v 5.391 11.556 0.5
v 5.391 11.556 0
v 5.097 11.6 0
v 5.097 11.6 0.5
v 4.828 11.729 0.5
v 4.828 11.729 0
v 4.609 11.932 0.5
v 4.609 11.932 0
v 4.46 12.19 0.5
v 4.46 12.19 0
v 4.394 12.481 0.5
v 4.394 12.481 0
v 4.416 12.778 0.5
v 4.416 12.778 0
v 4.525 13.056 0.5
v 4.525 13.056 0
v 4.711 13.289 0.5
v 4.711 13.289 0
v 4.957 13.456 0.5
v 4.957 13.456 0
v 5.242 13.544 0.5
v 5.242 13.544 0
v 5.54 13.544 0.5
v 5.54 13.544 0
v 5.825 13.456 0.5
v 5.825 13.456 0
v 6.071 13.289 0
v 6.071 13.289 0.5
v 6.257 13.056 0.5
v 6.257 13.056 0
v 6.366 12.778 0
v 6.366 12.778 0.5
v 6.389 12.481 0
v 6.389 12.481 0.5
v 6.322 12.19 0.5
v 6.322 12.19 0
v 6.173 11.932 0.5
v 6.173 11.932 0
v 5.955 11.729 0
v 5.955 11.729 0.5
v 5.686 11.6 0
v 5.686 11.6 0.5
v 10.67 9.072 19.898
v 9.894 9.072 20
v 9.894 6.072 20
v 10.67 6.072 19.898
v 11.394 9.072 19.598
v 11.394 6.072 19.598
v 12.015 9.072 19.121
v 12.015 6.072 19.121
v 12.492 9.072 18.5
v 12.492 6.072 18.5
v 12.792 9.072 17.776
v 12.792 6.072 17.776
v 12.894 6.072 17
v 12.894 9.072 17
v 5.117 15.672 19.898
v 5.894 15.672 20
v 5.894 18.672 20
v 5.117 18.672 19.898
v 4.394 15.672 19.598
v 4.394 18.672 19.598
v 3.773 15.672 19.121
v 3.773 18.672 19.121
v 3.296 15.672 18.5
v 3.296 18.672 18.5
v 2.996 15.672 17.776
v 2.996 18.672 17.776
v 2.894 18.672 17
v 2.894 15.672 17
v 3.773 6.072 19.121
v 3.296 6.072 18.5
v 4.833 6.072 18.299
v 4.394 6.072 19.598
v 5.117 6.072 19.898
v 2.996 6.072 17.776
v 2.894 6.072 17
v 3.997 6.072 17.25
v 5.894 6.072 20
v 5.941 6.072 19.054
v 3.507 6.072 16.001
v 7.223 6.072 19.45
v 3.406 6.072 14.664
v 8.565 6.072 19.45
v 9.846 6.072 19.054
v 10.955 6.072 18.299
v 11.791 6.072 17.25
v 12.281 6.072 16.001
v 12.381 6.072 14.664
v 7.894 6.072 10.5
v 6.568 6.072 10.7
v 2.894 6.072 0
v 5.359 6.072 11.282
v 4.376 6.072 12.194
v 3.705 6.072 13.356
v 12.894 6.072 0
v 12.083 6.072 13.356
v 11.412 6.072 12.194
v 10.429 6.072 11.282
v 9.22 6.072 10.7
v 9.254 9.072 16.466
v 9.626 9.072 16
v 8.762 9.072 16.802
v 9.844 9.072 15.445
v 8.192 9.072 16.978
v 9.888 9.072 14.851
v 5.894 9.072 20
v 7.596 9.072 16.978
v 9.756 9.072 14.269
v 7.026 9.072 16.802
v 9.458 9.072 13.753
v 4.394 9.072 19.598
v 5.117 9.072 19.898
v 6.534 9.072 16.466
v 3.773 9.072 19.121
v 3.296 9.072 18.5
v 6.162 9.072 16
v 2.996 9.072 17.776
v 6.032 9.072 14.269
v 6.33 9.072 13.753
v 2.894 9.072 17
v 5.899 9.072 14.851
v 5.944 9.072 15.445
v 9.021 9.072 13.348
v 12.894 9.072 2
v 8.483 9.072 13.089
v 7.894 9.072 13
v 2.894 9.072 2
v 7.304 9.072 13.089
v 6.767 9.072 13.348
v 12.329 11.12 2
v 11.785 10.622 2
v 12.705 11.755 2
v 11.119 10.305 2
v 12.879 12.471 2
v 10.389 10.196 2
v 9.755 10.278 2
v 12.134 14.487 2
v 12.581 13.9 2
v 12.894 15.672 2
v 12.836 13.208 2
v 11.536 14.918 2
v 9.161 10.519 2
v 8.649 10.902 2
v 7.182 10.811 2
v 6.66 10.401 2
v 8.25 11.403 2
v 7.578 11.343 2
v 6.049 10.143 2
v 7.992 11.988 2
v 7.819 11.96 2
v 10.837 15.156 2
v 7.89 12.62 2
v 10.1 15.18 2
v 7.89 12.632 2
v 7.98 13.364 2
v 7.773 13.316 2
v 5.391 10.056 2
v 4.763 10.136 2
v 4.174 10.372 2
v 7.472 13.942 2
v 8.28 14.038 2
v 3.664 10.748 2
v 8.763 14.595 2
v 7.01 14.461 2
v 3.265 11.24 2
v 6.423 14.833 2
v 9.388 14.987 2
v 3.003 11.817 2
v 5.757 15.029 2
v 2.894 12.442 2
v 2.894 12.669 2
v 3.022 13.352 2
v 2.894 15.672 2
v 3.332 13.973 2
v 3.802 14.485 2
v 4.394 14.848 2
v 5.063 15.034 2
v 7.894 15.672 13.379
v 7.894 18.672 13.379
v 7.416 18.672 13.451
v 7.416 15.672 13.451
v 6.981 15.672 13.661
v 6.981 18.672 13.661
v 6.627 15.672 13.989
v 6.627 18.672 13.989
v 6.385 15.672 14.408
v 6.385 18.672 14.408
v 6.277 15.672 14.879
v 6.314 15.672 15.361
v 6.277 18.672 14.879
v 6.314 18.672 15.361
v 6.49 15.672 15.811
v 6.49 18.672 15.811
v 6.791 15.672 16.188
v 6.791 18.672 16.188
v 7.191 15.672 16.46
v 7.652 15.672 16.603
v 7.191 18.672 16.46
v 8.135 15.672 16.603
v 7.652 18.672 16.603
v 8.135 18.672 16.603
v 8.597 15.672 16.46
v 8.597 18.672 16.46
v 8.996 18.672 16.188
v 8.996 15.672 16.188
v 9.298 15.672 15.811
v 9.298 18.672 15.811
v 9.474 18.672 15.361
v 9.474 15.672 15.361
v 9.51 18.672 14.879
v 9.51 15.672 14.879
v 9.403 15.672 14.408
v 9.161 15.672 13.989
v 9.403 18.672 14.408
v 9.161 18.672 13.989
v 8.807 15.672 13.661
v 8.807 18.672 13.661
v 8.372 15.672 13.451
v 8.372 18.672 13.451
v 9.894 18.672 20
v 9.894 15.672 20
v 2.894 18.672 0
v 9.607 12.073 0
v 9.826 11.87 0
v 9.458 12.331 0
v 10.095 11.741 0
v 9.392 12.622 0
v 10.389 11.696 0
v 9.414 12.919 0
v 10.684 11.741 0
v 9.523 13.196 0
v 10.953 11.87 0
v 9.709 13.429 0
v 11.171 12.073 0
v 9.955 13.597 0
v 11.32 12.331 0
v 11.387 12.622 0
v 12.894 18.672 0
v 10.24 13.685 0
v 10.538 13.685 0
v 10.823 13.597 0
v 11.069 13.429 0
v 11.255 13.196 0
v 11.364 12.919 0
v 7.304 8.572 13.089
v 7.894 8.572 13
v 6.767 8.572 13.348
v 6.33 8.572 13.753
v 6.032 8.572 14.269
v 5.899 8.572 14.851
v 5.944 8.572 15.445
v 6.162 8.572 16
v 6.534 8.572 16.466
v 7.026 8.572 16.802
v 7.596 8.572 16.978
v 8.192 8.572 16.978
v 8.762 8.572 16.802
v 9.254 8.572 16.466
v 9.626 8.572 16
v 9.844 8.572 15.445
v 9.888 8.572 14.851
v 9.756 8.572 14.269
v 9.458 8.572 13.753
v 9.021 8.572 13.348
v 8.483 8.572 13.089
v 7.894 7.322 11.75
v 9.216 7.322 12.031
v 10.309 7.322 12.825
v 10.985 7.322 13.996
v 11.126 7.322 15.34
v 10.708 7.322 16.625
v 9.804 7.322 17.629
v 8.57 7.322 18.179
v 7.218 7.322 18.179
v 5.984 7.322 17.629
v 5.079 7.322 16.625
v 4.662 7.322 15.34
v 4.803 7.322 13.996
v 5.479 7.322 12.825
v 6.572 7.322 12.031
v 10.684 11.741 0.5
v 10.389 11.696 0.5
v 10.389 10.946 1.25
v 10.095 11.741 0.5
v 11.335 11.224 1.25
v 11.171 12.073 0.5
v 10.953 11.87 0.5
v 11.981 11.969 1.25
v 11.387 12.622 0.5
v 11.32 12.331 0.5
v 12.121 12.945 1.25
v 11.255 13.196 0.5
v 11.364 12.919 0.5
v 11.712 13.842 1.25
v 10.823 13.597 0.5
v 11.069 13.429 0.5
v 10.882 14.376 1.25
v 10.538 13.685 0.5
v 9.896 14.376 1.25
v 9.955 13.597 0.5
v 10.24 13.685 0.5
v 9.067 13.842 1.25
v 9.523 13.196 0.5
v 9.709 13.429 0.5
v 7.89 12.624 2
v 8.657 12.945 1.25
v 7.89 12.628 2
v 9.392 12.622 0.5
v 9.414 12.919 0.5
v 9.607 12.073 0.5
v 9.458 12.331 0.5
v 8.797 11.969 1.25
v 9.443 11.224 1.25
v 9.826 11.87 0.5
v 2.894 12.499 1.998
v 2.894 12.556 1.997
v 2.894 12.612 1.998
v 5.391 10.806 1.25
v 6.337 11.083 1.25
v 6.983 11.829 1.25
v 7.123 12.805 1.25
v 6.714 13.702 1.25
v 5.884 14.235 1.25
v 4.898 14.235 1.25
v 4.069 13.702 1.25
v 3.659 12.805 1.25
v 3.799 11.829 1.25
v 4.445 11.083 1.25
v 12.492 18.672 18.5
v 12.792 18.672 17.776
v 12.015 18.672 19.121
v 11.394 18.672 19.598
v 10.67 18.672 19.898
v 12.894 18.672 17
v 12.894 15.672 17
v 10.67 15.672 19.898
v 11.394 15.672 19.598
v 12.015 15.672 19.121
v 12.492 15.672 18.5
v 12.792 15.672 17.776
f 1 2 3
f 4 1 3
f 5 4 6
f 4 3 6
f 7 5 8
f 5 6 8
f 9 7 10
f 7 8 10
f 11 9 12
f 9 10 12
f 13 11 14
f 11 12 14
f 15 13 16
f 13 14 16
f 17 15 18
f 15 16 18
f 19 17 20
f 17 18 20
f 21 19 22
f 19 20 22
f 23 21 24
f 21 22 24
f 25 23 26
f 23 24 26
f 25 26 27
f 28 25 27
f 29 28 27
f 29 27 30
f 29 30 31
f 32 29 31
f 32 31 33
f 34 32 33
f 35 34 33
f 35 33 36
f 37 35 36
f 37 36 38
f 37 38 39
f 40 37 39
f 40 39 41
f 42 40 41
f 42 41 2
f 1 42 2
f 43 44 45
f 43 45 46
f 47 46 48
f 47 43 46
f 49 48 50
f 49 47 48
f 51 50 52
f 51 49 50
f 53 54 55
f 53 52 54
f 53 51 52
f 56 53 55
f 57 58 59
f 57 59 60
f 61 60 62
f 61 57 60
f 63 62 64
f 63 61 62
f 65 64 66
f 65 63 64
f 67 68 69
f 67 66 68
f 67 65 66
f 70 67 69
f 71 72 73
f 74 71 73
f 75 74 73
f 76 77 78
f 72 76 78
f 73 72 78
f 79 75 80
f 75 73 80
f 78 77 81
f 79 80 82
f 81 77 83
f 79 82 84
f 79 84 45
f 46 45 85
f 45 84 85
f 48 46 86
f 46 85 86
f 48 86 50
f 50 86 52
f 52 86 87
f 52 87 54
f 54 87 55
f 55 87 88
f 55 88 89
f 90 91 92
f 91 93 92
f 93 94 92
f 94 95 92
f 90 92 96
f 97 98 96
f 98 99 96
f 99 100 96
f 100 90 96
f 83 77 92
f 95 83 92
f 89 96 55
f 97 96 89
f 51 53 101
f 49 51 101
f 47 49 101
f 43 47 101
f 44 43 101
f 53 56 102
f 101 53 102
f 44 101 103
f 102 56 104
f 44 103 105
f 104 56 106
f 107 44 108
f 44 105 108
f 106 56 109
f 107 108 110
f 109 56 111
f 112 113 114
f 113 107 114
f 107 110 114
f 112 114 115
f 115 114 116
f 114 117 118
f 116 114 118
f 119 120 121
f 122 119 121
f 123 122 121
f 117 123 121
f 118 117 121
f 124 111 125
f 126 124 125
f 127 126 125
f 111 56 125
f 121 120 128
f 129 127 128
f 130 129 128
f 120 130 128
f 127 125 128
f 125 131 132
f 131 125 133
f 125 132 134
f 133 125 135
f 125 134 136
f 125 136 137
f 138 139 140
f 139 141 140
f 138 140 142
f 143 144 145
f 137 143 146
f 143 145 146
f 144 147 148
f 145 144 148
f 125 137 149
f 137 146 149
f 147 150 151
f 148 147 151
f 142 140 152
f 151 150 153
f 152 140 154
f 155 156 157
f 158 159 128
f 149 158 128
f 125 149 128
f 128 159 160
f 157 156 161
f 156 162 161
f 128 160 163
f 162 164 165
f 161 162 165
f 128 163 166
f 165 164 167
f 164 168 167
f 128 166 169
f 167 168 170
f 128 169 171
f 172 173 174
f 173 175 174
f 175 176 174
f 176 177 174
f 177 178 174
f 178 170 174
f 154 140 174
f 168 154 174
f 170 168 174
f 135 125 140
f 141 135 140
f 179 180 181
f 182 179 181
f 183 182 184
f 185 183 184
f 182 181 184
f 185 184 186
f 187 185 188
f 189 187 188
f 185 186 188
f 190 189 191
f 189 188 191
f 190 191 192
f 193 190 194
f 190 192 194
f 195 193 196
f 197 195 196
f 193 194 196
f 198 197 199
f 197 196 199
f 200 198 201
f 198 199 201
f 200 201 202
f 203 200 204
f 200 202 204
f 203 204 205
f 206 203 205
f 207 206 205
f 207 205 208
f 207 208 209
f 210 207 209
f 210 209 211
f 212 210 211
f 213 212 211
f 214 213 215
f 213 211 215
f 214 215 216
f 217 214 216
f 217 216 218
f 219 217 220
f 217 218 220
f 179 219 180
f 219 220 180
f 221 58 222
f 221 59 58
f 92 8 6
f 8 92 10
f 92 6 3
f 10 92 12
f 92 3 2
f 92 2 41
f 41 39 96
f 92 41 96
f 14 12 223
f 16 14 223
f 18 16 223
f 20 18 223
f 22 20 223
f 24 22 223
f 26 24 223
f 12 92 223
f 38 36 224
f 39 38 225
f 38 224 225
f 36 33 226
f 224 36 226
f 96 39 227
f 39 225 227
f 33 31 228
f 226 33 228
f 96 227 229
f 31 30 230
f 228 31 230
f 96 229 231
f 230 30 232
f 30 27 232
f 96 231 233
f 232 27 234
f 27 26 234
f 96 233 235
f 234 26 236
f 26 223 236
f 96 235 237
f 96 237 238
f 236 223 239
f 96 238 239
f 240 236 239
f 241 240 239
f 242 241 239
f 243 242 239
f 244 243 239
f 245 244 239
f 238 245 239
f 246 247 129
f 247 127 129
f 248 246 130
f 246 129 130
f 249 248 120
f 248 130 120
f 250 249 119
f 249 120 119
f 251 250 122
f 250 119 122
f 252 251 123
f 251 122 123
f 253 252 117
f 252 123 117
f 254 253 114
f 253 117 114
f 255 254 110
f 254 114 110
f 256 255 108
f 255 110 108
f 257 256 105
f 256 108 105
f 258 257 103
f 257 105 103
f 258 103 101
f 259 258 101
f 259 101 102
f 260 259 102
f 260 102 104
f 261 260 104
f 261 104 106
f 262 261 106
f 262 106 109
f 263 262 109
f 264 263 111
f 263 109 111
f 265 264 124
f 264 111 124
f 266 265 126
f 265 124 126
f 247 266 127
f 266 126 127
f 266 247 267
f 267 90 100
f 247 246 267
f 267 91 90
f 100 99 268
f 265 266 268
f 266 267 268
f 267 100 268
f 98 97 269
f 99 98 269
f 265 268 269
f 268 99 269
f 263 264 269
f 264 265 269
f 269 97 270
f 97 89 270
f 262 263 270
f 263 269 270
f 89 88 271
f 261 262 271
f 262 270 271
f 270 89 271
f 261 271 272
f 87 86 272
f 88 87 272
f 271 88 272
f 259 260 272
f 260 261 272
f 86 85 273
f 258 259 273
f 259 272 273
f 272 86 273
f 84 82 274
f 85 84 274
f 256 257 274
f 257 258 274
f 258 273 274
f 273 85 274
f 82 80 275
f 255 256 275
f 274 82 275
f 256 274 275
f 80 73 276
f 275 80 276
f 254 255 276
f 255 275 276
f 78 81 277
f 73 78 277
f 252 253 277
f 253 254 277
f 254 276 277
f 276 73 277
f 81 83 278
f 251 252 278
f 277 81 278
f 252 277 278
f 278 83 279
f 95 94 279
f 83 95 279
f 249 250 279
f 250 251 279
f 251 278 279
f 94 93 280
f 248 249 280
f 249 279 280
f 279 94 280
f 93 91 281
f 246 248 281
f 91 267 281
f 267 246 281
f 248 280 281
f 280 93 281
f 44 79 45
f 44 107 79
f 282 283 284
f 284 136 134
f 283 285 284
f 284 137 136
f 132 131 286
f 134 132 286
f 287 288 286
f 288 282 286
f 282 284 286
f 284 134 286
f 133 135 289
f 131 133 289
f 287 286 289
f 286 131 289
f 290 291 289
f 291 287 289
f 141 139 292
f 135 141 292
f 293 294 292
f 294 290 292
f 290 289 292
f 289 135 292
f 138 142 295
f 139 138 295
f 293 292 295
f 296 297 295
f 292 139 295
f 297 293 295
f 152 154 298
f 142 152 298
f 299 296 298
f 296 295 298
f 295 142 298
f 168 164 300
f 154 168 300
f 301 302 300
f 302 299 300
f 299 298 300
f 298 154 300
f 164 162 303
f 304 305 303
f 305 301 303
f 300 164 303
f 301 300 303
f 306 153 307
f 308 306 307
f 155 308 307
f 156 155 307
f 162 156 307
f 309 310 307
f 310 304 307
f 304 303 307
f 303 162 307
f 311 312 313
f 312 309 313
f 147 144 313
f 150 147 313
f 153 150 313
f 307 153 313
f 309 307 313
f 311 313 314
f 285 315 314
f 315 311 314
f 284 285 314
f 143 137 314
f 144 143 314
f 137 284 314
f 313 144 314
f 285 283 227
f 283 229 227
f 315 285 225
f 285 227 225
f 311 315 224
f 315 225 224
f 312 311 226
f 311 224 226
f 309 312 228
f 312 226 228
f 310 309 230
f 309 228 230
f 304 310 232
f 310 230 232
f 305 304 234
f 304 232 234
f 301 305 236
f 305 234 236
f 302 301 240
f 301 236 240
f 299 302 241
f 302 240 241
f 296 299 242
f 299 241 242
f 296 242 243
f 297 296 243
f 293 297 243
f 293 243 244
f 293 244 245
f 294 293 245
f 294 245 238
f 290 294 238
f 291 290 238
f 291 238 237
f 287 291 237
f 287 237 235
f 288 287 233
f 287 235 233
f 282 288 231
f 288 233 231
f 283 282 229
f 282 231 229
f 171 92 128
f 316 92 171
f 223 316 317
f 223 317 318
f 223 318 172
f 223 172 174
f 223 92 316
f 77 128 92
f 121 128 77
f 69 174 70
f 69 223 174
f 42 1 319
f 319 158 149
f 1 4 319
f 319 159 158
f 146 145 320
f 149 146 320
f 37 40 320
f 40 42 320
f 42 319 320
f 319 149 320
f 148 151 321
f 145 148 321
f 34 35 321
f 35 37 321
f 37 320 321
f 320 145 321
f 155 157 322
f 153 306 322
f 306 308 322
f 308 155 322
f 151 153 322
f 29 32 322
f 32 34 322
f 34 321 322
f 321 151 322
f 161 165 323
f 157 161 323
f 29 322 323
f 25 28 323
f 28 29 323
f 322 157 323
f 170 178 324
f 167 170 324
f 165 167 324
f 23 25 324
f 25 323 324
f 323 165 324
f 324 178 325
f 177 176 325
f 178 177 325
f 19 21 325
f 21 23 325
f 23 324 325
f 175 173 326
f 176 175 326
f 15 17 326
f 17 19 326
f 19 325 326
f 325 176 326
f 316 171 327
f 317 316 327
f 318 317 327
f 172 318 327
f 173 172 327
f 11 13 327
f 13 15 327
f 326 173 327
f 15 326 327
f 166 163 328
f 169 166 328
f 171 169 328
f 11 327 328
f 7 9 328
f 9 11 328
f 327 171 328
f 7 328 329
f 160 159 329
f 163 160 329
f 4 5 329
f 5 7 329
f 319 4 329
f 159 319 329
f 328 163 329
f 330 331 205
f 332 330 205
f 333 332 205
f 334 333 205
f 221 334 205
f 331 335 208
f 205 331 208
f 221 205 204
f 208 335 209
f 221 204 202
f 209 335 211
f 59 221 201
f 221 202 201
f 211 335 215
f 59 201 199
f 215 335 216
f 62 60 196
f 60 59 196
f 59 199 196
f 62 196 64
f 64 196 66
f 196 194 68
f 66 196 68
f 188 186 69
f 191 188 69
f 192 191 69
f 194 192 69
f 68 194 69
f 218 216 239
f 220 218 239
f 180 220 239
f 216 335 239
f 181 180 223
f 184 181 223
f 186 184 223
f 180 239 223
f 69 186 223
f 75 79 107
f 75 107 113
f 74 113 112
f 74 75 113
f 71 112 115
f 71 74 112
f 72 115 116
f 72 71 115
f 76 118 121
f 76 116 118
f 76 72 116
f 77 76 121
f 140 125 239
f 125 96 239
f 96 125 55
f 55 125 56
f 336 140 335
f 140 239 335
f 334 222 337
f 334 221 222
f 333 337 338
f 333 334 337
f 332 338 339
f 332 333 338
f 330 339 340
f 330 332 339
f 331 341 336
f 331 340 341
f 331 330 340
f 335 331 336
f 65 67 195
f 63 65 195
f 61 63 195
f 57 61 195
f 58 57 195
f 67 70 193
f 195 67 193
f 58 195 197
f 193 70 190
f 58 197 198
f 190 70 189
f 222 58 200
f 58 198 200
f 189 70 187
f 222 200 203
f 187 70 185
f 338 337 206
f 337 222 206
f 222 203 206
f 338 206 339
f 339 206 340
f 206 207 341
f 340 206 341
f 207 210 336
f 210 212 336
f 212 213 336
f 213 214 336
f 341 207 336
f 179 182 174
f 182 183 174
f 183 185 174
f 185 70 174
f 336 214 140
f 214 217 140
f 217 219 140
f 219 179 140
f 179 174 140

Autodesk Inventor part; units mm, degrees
ref_plane "YZ Plane" through (0, 0, 0) normal (1, 0, 0) x (0, 1, 0)
ref_plane "XZ Plane" through (0, 0, 0) normal (0, 1, 0) x (-1, 0, 0)
ref_plane "XY Plane" through (0, 0, 0) normal (0, 0, 1) x (1, 0, 0)
sketch "Skizze1" plane through (0, 0, 0) normal (0, 0, 1) x (1, 0, 0)
  line L0 (12.8939, 18.6723) -> (2.8939, 18.6723)
  line L1 (2.8939, 18.6723) -> (2.8939, 15.6723)
  line L2 (2.8939, 15.6723) -> (12.8939, 15.6723)
  line L3 (12.8939, 15.6723) -> (12.8939, 18.6723)
  line L4 (12.8939, 9.0723) -> (2.8939, 9.0723)
  line L5 (2.8939, 9.0723) -> (2.8939, 6.0723)
  line L6 (2.8939, 6.0723) -> (12.8939, 6.0723)
  line L7 (12.8939, 6.0723) -> (12.8939, 9.0723)
  line L8 (12.8939, 15.6723) -> (12.8939, 12.3723) construction
  line L9 (12.8939, 12.3723) -> (12.8939, 9.0723) construction
  point P0 (0, 0)
  point P1 (7.8939, 9.0723)
  dimension "d0" = 10
  dimension "d1" = 3
  dimension "d2" = 3
  dimension "d3" = 6.6
extrude "Extrusion1" add sketch "Skizze1" along normal blind 20
fillet "Rundung1" radius 3 4 edges at (12.8939, 7.5723, 20) (12.8939, 17.1723, 20) (2.8939, 17.1723, 20) (2.8939, 7.5723, 20)
sketch "Skizze2" plane through (2.8939, 6.0723, 0) normal (0, -1, 0) x (1, 0, 0)
  circle A0 centre (5, 15) radius 5 construction
  line L0 (10, 0) -> (10, 17) construction
  line L1 (0, 0) -> (0, 17) construction
  line L2 (3, 20) -> (7, 20) construction
  point P0 (-2.8939, 0)
hole "Bohrung1" at (7.8939, 6.0723, 15) direction (0, 1, 0) diameter 3.242 end through all countersink diameter 9 countersink angle 90 thread size "M4x0.7" class "6H" standard "ISO Metric profile"
sketch "Skizze3" plane through (2.8939, 15.6723, 0) normal (0, -1, 0) x (1, 0, 0)
  line L0 (0, 0) -> (10, 0) projected
  line L1 (10, 0) -> (10, 2)
  line L2 (10, 0) -> (10, 17) projected
  line L3 (10, 2) -> (0, 2)
  line L4 (0, 0) -> (0, 17) projected
  point P0 (-2.8939, 0)
  dimension "d15" = 2
extrude "Extrusion2" add sketch "Skizze3" along normal through all
sketch "Skizze4" plane through (2.8939, 15.6723, 2) normal (0, 0, 1) x (1, 0, 0)
  line L0 (10, -3.3) -> (10, 0) construction
  line L1 (10, -3.3) -> (10, -6.6) construction
  line L2 (0, -3.3) -> (0, -6.6) construction
  line L3 (0, 0) -> (0, -3.3) construction
  line L4 (7, 3) -> (3, 3) construction
  line L5 (0, 3) -> (0, 0) construction
  line L6 (-4, -3.3) -> (5, -3.3) construction
  line L7 (-4, -3.3) -> (4.9964, -3.0464) construction
  line L8 (-4, -3.3) -> (5, -3.3) construction
  line L9 (2.4974, -3.1169) -> (4.9964, -3.0464) construction
  line L10 (4.9964, -3.0464) -> (7.4954, -2.976) construction
  point P0 (-2.8939, -15.6723)
  dimension "d34" = 5
  dimension "d35" = 9
  dimension "d36" = 6.3
  dimension "d37" = 5
  dimension "d38" = 9
  dimension "d40" = 9
  dimension "d41" = -1.615
hole "Bohrung2" at (10.3893, 12.6964, 2) at (5.3913, 12.5555, 2) direction (0, 0, -1) diameter 2 end through all countersink diameter 5 countersink angle 90
sketch "Skizze5" plane through (2.8939, 6.0723, 0) normal (0, -1, 0) x (1, 0, 0)
  circle A0 centre (5, 15) radius 4.5 projected
  point P0 (-2.8939, 0)
hole "Bohrung3" at (7.8939, 6.0723, 15) direction (0, 1, 0) diameter 4 depth 3
equation "\"d41\" = -schrägWinkel"
equation "\"schrägWinkel\" = 1.614505deg"
properties part number "HalterUmlenkrolleOVL" material "PC/ABS-Kunststoff, 3DDruck, PLA"
